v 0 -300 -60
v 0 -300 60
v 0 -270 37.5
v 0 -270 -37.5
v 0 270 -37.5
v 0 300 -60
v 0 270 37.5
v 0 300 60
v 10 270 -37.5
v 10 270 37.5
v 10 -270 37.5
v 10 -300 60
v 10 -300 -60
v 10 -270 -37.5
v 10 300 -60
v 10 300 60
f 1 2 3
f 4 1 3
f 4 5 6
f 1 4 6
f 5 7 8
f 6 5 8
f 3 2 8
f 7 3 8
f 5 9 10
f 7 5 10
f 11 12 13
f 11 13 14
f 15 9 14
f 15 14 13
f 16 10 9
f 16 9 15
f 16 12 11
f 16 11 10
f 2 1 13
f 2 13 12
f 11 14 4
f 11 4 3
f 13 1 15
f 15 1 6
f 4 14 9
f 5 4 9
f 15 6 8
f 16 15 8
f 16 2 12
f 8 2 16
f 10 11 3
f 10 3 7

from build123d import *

# Parameters (mm, degrees)
SKETCH_W     = 600
SKETCH_H     = 120
PAD_DEPTH    = 10
SKETCH001_W  = 540
SKETCH001_H  = 75
POCKET_DEPTH = 10


with BuildPart() as part:
    # Sketch → Pad (new body)
    with BuildSketch(Plane.YZ):
        Rectangle(SKETCH_W, SKETCH_H)
    extrude(amount=PAD_DEPTH)

    # Sketch001 → Pocket (cut)
    with BuildSketch(Plane.YZ.offset(10)):
        Rectangle(SKETCH001_W, SKETCH001_H)
    extrude(amount=-POCKET_DEPTH, mode=Mode.SUBTRACT)


solid = part.part
